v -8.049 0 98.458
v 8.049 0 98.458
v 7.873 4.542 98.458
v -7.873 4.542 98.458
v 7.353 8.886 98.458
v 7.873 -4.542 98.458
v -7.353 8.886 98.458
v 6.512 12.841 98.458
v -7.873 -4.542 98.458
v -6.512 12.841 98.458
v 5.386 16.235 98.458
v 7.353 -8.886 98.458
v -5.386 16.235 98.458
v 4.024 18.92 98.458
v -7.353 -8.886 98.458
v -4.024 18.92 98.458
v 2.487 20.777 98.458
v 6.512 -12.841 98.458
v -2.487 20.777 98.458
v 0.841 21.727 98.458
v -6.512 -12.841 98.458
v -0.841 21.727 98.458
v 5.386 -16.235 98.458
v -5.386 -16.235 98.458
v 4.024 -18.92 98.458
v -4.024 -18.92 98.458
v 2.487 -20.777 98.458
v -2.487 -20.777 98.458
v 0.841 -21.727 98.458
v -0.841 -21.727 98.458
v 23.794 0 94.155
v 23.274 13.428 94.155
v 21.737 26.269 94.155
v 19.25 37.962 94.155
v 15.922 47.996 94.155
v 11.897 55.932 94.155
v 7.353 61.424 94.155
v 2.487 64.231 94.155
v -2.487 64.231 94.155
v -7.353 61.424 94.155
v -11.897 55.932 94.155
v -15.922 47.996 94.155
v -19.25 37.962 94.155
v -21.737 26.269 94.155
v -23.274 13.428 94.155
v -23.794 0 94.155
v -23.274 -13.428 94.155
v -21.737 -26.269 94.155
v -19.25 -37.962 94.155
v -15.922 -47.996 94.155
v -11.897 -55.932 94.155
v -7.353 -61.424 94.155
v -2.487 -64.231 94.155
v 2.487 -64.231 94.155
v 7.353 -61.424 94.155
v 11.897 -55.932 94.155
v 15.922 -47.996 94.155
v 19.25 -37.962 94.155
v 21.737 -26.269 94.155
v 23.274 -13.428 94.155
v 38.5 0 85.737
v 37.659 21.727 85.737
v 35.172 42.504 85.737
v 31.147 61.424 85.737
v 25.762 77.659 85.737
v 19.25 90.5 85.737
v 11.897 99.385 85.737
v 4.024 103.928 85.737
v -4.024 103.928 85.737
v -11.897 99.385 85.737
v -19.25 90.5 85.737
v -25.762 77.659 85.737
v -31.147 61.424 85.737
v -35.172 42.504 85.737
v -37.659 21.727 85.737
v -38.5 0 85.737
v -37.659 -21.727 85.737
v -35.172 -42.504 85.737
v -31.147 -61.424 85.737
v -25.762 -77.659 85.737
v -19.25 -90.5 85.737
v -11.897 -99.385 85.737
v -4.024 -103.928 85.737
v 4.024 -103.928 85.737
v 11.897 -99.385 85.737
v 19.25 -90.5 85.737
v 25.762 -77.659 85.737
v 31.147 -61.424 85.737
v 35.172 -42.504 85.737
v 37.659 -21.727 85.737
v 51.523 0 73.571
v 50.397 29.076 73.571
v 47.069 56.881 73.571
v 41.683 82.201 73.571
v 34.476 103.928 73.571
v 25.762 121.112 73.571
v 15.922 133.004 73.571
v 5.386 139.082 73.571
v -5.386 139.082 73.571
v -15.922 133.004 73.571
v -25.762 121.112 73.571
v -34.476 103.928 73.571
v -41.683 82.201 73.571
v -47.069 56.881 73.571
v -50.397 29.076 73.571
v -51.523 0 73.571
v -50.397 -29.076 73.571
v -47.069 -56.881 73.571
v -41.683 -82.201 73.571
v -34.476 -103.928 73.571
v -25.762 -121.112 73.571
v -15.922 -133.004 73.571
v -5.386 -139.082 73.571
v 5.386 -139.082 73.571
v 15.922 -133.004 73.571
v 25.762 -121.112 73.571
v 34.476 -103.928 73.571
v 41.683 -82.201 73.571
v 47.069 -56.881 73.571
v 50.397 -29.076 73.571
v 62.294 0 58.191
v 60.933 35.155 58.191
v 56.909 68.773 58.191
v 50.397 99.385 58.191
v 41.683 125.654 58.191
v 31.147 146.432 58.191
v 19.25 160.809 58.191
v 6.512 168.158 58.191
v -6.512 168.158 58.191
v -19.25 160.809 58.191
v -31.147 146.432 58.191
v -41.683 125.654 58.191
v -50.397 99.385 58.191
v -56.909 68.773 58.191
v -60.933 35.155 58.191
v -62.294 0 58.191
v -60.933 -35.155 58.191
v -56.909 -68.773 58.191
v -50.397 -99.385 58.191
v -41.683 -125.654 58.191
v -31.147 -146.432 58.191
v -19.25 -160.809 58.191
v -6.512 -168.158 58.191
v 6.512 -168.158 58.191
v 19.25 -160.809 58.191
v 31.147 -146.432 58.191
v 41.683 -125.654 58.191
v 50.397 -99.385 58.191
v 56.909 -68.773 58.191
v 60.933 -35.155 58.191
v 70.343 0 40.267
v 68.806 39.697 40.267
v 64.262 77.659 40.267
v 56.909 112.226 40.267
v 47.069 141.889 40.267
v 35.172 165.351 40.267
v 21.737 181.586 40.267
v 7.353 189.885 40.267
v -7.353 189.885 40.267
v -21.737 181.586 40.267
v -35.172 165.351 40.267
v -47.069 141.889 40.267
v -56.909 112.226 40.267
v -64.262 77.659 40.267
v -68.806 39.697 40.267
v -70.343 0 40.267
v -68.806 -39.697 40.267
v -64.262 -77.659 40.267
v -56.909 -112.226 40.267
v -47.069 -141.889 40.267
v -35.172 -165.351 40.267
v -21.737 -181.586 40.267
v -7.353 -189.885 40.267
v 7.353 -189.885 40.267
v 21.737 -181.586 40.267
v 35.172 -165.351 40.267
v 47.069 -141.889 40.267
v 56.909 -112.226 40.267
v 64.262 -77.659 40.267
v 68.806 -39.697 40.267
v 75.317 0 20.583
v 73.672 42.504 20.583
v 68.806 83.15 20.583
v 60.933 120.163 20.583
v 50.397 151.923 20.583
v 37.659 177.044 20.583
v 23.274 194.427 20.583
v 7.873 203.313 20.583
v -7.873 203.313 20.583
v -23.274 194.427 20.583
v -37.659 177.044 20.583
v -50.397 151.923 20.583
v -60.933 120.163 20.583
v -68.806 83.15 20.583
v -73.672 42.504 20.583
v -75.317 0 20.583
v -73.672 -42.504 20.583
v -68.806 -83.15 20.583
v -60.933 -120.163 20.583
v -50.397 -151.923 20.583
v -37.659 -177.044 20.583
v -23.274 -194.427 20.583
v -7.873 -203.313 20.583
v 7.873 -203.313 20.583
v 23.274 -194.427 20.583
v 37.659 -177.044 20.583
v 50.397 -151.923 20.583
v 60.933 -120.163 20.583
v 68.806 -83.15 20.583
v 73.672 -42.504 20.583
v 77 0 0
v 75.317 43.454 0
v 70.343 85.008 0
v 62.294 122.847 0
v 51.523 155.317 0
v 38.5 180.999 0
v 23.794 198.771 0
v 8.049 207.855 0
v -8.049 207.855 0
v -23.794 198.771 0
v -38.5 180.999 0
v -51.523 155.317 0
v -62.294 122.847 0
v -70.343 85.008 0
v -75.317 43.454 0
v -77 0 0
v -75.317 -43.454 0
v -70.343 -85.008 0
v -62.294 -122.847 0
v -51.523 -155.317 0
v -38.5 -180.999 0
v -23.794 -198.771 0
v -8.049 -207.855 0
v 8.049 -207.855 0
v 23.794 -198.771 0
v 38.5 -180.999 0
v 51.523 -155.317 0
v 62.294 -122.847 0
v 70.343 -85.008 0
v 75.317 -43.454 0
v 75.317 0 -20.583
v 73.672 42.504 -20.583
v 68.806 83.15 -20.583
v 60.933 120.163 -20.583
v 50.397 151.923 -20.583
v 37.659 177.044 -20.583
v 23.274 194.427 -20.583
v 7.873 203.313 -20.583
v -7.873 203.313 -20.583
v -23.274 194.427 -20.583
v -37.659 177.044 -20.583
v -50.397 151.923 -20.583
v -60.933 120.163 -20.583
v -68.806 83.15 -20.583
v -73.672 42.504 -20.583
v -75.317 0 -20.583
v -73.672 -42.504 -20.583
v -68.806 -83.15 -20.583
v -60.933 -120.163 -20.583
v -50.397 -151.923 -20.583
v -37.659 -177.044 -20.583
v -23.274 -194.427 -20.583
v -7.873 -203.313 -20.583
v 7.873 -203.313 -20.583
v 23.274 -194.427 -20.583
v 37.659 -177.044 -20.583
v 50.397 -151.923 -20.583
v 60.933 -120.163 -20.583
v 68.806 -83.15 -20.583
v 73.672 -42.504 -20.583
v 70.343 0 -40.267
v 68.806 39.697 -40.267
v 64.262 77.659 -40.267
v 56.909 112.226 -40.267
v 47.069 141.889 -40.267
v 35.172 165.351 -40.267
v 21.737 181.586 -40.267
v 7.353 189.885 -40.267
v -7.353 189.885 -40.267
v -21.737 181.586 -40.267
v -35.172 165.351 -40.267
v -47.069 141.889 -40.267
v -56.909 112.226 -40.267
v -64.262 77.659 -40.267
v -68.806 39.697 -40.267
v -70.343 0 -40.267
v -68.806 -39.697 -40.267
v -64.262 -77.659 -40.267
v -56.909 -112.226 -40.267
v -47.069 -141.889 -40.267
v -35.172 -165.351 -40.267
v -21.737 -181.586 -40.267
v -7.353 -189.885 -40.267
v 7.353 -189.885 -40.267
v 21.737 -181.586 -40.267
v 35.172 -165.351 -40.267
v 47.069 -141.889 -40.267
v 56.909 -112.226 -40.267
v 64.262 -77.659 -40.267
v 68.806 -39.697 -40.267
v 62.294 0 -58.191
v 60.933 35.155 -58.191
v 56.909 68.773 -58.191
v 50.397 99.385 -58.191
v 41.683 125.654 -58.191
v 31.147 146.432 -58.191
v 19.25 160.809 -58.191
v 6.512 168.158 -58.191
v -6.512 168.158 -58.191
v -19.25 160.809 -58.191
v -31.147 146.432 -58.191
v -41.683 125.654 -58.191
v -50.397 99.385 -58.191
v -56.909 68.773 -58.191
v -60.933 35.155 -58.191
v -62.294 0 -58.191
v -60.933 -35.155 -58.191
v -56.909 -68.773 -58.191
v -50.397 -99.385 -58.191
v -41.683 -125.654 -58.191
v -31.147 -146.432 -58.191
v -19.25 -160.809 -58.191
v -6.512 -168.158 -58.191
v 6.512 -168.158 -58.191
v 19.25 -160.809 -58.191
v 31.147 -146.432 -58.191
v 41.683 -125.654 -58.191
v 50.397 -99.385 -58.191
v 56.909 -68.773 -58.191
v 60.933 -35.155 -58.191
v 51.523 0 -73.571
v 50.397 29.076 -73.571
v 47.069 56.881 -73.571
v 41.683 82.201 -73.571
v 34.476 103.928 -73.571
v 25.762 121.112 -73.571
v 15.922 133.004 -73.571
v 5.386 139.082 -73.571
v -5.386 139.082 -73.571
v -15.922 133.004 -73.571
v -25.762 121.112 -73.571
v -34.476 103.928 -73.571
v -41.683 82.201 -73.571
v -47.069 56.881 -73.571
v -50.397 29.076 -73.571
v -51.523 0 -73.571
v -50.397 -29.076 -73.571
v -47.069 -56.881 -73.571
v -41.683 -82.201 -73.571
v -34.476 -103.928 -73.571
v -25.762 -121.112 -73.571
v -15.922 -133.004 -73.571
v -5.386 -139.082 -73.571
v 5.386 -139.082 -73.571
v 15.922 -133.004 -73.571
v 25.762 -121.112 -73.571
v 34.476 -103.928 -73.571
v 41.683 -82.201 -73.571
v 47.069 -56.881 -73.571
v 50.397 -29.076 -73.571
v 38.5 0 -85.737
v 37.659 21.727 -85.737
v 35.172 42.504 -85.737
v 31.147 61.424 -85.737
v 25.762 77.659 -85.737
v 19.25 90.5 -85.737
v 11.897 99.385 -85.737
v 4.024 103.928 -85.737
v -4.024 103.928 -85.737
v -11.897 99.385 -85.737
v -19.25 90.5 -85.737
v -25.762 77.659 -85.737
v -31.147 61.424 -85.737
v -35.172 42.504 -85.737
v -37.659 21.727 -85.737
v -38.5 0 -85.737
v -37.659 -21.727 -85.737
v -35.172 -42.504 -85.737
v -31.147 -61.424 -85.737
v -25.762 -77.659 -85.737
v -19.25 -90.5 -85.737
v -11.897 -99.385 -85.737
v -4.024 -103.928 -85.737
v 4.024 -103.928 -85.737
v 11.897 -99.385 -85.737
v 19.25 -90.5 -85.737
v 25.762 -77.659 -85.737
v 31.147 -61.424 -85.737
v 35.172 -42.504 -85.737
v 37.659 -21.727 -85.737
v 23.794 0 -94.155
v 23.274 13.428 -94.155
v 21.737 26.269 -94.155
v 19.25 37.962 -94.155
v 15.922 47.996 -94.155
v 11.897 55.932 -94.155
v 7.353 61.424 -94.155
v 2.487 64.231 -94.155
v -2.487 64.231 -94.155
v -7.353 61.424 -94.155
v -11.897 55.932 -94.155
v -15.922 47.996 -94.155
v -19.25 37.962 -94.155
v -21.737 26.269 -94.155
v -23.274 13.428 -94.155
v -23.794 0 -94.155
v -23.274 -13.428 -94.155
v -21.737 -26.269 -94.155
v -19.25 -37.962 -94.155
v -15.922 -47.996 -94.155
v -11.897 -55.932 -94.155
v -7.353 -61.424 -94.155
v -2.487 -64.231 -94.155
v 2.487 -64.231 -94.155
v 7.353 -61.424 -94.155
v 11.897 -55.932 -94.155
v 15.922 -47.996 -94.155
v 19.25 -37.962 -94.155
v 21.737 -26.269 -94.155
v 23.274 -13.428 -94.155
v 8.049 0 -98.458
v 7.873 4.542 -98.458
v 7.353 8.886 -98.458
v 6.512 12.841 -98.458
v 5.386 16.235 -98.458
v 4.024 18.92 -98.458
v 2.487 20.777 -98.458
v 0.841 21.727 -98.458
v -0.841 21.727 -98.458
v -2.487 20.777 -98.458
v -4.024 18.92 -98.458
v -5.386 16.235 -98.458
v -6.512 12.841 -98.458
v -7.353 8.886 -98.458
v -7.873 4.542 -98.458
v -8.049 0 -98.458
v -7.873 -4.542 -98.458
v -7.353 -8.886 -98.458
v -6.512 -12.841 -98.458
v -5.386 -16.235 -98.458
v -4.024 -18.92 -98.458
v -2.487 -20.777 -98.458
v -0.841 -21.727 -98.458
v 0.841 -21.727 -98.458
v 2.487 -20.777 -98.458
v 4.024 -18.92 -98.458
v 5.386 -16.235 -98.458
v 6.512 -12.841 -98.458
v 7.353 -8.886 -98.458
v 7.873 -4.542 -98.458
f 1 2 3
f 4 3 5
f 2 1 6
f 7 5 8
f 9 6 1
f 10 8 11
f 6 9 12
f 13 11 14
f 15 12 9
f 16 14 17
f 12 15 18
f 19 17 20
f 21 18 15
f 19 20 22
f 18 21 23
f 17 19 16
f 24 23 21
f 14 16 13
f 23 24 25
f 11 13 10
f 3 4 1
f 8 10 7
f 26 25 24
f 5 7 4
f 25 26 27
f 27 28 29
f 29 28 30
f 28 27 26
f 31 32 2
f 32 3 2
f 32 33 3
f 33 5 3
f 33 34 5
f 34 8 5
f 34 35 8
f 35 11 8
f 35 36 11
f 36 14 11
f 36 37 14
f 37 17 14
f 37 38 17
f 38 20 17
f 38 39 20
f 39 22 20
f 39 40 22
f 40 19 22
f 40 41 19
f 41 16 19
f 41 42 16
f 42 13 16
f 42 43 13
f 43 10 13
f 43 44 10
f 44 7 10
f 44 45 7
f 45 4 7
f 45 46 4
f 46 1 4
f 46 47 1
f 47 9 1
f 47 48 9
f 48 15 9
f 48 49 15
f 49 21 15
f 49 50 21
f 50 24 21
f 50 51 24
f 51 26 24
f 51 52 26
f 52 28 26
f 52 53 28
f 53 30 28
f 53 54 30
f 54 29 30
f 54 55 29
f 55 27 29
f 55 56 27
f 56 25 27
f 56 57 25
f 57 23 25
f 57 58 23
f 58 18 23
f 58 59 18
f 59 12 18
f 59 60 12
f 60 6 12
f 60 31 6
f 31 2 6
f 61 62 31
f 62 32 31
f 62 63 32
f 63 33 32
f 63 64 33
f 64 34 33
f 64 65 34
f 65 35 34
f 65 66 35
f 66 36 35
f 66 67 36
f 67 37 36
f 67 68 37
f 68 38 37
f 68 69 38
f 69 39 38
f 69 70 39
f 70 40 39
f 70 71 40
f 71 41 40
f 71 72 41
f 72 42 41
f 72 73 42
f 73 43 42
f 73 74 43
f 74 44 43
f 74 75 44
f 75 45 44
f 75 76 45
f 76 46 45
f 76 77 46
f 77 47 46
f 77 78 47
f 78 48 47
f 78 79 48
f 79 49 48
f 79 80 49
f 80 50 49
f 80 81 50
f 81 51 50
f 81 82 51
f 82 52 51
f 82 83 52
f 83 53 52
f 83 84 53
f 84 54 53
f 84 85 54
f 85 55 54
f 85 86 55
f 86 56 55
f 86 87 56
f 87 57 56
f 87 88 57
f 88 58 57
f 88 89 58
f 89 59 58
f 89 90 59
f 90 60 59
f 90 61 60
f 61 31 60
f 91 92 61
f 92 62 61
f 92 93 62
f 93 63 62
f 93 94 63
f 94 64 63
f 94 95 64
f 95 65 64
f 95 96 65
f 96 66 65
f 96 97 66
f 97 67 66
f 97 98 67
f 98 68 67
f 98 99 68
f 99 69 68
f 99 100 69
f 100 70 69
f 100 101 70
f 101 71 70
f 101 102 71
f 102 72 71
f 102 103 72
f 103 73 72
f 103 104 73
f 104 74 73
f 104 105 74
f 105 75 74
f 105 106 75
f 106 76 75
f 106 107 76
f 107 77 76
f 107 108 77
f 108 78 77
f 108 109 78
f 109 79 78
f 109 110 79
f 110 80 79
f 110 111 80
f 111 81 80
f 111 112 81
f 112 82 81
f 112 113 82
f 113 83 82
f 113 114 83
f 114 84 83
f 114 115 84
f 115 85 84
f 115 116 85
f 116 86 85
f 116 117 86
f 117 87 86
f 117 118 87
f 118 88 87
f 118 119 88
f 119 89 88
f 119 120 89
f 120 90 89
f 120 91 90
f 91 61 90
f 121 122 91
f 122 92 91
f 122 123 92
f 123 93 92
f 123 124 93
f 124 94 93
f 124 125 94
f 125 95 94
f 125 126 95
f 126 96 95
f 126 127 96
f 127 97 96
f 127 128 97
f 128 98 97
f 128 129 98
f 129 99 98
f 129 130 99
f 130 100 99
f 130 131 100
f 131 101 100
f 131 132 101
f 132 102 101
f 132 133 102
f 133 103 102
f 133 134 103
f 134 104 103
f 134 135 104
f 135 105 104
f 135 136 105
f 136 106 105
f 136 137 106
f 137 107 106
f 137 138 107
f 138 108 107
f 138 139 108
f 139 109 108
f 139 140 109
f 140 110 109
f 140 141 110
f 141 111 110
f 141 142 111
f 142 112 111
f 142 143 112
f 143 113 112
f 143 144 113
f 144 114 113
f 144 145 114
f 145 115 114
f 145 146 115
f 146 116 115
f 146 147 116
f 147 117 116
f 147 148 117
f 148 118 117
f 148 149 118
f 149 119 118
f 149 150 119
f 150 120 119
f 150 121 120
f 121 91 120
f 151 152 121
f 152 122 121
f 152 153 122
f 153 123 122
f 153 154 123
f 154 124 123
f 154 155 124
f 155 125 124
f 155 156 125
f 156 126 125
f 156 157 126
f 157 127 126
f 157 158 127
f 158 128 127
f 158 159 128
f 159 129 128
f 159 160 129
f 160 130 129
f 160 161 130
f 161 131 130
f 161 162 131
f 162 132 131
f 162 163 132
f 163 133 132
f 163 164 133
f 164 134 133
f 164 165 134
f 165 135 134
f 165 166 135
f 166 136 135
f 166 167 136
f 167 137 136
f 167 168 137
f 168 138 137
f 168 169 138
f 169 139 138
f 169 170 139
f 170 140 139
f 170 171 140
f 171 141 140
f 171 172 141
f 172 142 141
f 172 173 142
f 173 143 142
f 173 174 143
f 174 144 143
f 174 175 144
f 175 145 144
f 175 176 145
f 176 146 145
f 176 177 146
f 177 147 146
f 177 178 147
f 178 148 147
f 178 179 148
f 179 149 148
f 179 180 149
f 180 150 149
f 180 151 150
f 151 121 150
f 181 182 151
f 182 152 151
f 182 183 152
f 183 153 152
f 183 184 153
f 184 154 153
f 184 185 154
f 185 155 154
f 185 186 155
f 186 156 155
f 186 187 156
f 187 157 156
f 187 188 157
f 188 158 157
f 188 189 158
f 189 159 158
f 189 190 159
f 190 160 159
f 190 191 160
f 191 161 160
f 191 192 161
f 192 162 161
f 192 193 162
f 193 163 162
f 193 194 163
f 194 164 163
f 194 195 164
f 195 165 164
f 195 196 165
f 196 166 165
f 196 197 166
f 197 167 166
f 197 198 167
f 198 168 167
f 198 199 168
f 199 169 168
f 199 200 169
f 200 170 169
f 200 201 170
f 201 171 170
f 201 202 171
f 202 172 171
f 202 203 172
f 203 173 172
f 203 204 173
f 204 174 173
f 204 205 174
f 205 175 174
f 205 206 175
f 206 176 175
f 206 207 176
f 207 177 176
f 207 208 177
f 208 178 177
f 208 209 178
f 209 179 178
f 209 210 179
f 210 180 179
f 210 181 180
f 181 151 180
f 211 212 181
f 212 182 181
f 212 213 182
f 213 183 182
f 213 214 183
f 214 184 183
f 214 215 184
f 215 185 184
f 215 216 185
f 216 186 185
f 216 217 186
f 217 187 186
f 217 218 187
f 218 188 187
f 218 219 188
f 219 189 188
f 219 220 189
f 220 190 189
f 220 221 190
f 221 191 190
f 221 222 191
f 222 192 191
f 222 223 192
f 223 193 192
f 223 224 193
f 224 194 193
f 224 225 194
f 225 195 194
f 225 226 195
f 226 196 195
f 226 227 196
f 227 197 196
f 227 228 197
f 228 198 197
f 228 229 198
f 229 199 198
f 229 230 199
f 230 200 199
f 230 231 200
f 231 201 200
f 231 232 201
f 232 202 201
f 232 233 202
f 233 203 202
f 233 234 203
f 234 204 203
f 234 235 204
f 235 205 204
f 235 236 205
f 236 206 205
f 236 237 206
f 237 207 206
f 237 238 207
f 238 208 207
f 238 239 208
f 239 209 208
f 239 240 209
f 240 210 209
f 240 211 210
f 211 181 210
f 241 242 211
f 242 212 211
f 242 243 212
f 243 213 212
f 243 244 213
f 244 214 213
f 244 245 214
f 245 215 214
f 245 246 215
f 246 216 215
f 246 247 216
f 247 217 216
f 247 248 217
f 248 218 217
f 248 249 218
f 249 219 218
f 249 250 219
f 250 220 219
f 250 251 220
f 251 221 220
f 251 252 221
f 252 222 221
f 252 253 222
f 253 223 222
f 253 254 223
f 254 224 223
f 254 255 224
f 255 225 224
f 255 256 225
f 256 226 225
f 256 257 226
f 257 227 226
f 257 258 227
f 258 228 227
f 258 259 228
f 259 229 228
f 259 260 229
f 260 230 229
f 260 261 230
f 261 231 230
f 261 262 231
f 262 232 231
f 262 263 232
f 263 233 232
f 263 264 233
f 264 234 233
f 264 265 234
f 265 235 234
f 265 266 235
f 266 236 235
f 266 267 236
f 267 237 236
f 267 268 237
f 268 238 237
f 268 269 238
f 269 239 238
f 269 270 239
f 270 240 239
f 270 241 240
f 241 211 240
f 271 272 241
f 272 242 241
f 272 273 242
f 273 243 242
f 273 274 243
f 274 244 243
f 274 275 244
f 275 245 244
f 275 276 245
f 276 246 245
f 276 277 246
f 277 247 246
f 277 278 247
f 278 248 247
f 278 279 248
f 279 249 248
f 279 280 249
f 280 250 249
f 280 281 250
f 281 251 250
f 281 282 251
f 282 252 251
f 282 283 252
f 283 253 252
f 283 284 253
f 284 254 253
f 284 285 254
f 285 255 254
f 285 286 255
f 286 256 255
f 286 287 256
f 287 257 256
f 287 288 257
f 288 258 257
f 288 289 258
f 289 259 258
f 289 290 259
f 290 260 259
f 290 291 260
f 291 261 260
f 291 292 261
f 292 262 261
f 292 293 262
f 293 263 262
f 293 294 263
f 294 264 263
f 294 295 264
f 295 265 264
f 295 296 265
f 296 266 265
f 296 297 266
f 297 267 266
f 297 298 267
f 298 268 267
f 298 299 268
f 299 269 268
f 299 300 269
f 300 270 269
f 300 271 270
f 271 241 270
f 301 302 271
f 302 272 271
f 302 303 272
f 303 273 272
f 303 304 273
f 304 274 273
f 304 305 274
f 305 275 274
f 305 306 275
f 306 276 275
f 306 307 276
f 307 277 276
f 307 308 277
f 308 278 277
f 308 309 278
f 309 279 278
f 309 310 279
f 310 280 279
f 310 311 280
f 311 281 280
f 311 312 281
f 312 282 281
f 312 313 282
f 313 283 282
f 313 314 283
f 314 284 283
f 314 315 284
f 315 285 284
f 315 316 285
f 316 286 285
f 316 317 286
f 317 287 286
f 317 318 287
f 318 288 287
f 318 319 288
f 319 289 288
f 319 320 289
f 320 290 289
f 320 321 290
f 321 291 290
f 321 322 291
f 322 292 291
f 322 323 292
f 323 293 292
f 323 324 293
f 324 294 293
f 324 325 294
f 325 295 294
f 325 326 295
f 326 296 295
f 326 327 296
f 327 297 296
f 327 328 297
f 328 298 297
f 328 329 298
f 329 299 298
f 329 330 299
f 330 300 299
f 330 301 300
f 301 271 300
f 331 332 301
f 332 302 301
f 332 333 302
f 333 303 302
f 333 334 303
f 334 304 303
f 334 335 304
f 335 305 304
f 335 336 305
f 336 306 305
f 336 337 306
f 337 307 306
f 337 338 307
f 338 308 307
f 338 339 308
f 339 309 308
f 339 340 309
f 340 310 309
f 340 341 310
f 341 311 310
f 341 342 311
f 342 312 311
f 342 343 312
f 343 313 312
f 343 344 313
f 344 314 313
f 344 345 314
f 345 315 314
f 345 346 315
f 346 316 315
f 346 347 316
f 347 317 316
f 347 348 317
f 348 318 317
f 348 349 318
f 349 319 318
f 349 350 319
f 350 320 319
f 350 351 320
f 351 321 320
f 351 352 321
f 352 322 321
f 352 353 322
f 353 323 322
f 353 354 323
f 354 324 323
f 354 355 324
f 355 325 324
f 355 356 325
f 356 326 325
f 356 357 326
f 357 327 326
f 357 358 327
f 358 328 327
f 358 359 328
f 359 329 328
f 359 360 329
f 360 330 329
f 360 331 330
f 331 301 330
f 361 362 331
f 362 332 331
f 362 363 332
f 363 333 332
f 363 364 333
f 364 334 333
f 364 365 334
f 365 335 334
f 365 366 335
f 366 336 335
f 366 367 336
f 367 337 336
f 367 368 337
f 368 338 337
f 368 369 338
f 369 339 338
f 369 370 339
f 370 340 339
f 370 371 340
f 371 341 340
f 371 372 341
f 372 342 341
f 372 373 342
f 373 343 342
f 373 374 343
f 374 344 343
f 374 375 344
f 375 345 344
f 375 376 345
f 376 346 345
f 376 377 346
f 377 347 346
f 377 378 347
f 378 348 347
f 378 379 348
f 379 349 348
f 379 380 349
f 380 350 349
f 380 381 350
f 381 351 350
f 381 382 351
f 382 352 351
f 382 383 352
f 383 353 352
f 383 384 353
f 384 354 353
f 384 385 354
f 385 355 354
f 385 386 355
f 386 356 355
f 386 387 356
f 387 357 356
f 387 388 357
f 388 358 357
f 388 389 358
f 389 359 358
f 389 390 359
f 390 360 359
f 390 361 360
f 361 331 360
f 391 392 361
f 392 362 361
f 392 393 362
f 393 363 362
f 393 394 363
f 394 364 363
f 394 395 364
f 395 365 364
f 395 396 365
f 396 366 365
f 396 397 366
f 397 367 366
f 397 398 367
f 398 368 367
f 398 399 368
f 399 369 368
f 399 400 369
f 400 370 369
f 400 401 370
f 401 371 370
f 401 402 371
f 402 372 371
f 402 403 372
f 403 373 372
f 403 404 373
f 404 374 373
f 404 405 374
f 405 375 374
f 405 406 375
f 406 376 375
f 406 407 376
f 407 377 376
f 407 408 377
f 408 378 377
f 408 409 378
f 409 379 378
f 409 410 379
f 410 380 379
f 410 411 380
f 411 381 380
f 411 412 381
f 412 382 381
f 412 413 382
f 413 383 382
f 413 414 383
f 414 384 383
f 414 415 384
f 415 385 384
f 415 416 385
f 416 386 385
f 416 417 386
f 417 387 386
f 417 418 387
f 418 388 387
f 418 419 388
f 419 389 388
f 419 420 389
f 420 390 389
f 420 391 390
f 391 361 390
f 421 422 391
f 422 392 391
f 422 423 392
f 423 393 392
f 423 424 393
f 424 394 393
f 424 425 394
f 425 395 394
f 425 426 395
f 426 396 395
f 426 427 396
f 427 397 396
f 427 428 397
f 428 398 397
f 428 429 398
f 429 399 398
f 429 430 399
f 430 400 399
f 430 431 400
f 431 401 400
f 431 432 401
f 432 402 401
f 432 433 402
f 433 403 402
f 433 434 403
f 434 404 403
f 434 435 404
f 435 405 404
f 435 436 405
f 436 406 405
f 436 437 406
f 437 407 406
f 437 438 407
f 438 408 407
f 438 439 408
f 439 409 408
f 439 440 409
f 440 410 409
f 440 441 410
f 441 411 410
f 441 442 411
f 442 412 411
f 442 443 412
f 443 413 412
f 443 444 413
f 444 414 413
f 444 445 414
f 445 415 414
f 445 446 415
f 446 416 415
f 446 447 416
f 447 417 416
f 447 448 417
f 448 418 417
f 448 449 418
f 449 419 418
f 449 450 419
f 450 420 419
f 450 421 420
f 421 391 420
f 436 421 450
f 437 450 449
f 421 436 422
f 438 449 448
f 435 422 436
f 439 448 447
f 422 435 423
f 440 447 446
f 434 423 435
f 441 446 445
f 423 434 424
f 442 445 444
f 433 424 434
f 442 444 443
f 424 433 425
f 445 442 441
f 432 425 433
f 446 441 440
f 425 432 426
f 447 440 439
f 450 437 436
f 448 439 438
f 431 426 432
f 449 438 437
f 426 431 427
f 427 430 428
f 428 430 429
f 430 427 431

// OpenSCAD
// Generated by SolidPython 1.0.1 on 2020-07-29 00:46:48


scale(v = [7, 19, 9]) {
	sphere(r = 11);
}
/***********************************************
*********      SolidPython code:      **********
************************************************
 
# import packages: SolidPython
from solid import *
from solid.utils import *
from itertools import chain, combinations, permutations


class Resize:

    def __init__(self, scad_file):
        self.scad_file = scad_file
        #self.scad_file = import_scad(scad_file)
        # cone/cylinder param:
        self.r1 = 0
        self.r2 = 0
        self.h = 0
        # rectangular prism param:
        self.w = 0
        self.l = 0
        # ellipse param:
        self.r = 0

    # import OpenScad code (file name corresponds to shape)


    # classify shape + parameters
    def assign(self, param1, param2, param3):
        if self.scad_file == 'cone.scad':
            self.r1 = param1
            self.r2 = param2
            self.h = param3
        elif self.scad_file == 'cylinder.scad':
            self.r1 = param1
            self.r2 = param2
            self.h = param3
        elif self.scad_file == 'rectangularPrism.scad':
            self.h = param1
            self.l = param2
            self.w = param3
        else:
            self.r = param1
            self.h = param2

    # resize parameters
    def iterate(self):
        x = range(3, 20, 2)
        i = 1
        if self.scad_file == 'cone.scad':
            tempList = list(permutations(x, 2))
            for temp in tempList:
                param1 = temp[0]
                param2 = temp[1]
                filepath = 'produced_scad_files/' + 'cone' + str(param1) + '_' + str(param2) + '_' + '.scad'
                scad_render_to_file(cylinder(h=param1, r1=param2, r2=0), filepath)

        elif self.scad_file == 'cylinder.scad':
            tempList = list(permutations(x, 3))
            for temp in tempList:
                param1 = temp[0]
                param2 = temp[1]
                filepath = 'produced_scad_files/' + 'cylinder' + str(param1) + '_' + str(param2) + '_' + '.scad'
                scad_render_to_file(cylinder(h=param1, r1=param2, r2=param2), filepath)

        elif self.scad_file == 'rectangularPrism.scad':
            tempList = list(permutations(x, 3))
            for temp in tempList:
                param1 = temp[0]
                param2 = temp[1]
                param3 = temp[2]
                filepath = 'produced_scad_files/' + 'rectangularPrism' + str(param1) + '_' + str(param2) + '_' + str(
                    param3) + '.scad'
                scad_render_to_file(cube(size=(param1, param2, param3)), filepath)

        elif self.scad_file == 'ellipse.scad':
            tempList = list(permutations(x, 4))
            for temp in tempList:
                param1 = temp[0]
                param2 = temp[1]
                param3 = temp[2]
                param4 = temp[3]
                filepath = 'produced_scad_files/' + 'ellipse' + str(param1) + '_' + str(param2) + '_' + str(param3) + '_' + str(param4) + '.scad'
                scad_render_to_file(scale([param1, param2, param3])(sphere(r=param4)), filepath)

    def render_to_scadfile(self):
        scad_render_to_file(scad, 'example.scad') 
 
************************************************/
